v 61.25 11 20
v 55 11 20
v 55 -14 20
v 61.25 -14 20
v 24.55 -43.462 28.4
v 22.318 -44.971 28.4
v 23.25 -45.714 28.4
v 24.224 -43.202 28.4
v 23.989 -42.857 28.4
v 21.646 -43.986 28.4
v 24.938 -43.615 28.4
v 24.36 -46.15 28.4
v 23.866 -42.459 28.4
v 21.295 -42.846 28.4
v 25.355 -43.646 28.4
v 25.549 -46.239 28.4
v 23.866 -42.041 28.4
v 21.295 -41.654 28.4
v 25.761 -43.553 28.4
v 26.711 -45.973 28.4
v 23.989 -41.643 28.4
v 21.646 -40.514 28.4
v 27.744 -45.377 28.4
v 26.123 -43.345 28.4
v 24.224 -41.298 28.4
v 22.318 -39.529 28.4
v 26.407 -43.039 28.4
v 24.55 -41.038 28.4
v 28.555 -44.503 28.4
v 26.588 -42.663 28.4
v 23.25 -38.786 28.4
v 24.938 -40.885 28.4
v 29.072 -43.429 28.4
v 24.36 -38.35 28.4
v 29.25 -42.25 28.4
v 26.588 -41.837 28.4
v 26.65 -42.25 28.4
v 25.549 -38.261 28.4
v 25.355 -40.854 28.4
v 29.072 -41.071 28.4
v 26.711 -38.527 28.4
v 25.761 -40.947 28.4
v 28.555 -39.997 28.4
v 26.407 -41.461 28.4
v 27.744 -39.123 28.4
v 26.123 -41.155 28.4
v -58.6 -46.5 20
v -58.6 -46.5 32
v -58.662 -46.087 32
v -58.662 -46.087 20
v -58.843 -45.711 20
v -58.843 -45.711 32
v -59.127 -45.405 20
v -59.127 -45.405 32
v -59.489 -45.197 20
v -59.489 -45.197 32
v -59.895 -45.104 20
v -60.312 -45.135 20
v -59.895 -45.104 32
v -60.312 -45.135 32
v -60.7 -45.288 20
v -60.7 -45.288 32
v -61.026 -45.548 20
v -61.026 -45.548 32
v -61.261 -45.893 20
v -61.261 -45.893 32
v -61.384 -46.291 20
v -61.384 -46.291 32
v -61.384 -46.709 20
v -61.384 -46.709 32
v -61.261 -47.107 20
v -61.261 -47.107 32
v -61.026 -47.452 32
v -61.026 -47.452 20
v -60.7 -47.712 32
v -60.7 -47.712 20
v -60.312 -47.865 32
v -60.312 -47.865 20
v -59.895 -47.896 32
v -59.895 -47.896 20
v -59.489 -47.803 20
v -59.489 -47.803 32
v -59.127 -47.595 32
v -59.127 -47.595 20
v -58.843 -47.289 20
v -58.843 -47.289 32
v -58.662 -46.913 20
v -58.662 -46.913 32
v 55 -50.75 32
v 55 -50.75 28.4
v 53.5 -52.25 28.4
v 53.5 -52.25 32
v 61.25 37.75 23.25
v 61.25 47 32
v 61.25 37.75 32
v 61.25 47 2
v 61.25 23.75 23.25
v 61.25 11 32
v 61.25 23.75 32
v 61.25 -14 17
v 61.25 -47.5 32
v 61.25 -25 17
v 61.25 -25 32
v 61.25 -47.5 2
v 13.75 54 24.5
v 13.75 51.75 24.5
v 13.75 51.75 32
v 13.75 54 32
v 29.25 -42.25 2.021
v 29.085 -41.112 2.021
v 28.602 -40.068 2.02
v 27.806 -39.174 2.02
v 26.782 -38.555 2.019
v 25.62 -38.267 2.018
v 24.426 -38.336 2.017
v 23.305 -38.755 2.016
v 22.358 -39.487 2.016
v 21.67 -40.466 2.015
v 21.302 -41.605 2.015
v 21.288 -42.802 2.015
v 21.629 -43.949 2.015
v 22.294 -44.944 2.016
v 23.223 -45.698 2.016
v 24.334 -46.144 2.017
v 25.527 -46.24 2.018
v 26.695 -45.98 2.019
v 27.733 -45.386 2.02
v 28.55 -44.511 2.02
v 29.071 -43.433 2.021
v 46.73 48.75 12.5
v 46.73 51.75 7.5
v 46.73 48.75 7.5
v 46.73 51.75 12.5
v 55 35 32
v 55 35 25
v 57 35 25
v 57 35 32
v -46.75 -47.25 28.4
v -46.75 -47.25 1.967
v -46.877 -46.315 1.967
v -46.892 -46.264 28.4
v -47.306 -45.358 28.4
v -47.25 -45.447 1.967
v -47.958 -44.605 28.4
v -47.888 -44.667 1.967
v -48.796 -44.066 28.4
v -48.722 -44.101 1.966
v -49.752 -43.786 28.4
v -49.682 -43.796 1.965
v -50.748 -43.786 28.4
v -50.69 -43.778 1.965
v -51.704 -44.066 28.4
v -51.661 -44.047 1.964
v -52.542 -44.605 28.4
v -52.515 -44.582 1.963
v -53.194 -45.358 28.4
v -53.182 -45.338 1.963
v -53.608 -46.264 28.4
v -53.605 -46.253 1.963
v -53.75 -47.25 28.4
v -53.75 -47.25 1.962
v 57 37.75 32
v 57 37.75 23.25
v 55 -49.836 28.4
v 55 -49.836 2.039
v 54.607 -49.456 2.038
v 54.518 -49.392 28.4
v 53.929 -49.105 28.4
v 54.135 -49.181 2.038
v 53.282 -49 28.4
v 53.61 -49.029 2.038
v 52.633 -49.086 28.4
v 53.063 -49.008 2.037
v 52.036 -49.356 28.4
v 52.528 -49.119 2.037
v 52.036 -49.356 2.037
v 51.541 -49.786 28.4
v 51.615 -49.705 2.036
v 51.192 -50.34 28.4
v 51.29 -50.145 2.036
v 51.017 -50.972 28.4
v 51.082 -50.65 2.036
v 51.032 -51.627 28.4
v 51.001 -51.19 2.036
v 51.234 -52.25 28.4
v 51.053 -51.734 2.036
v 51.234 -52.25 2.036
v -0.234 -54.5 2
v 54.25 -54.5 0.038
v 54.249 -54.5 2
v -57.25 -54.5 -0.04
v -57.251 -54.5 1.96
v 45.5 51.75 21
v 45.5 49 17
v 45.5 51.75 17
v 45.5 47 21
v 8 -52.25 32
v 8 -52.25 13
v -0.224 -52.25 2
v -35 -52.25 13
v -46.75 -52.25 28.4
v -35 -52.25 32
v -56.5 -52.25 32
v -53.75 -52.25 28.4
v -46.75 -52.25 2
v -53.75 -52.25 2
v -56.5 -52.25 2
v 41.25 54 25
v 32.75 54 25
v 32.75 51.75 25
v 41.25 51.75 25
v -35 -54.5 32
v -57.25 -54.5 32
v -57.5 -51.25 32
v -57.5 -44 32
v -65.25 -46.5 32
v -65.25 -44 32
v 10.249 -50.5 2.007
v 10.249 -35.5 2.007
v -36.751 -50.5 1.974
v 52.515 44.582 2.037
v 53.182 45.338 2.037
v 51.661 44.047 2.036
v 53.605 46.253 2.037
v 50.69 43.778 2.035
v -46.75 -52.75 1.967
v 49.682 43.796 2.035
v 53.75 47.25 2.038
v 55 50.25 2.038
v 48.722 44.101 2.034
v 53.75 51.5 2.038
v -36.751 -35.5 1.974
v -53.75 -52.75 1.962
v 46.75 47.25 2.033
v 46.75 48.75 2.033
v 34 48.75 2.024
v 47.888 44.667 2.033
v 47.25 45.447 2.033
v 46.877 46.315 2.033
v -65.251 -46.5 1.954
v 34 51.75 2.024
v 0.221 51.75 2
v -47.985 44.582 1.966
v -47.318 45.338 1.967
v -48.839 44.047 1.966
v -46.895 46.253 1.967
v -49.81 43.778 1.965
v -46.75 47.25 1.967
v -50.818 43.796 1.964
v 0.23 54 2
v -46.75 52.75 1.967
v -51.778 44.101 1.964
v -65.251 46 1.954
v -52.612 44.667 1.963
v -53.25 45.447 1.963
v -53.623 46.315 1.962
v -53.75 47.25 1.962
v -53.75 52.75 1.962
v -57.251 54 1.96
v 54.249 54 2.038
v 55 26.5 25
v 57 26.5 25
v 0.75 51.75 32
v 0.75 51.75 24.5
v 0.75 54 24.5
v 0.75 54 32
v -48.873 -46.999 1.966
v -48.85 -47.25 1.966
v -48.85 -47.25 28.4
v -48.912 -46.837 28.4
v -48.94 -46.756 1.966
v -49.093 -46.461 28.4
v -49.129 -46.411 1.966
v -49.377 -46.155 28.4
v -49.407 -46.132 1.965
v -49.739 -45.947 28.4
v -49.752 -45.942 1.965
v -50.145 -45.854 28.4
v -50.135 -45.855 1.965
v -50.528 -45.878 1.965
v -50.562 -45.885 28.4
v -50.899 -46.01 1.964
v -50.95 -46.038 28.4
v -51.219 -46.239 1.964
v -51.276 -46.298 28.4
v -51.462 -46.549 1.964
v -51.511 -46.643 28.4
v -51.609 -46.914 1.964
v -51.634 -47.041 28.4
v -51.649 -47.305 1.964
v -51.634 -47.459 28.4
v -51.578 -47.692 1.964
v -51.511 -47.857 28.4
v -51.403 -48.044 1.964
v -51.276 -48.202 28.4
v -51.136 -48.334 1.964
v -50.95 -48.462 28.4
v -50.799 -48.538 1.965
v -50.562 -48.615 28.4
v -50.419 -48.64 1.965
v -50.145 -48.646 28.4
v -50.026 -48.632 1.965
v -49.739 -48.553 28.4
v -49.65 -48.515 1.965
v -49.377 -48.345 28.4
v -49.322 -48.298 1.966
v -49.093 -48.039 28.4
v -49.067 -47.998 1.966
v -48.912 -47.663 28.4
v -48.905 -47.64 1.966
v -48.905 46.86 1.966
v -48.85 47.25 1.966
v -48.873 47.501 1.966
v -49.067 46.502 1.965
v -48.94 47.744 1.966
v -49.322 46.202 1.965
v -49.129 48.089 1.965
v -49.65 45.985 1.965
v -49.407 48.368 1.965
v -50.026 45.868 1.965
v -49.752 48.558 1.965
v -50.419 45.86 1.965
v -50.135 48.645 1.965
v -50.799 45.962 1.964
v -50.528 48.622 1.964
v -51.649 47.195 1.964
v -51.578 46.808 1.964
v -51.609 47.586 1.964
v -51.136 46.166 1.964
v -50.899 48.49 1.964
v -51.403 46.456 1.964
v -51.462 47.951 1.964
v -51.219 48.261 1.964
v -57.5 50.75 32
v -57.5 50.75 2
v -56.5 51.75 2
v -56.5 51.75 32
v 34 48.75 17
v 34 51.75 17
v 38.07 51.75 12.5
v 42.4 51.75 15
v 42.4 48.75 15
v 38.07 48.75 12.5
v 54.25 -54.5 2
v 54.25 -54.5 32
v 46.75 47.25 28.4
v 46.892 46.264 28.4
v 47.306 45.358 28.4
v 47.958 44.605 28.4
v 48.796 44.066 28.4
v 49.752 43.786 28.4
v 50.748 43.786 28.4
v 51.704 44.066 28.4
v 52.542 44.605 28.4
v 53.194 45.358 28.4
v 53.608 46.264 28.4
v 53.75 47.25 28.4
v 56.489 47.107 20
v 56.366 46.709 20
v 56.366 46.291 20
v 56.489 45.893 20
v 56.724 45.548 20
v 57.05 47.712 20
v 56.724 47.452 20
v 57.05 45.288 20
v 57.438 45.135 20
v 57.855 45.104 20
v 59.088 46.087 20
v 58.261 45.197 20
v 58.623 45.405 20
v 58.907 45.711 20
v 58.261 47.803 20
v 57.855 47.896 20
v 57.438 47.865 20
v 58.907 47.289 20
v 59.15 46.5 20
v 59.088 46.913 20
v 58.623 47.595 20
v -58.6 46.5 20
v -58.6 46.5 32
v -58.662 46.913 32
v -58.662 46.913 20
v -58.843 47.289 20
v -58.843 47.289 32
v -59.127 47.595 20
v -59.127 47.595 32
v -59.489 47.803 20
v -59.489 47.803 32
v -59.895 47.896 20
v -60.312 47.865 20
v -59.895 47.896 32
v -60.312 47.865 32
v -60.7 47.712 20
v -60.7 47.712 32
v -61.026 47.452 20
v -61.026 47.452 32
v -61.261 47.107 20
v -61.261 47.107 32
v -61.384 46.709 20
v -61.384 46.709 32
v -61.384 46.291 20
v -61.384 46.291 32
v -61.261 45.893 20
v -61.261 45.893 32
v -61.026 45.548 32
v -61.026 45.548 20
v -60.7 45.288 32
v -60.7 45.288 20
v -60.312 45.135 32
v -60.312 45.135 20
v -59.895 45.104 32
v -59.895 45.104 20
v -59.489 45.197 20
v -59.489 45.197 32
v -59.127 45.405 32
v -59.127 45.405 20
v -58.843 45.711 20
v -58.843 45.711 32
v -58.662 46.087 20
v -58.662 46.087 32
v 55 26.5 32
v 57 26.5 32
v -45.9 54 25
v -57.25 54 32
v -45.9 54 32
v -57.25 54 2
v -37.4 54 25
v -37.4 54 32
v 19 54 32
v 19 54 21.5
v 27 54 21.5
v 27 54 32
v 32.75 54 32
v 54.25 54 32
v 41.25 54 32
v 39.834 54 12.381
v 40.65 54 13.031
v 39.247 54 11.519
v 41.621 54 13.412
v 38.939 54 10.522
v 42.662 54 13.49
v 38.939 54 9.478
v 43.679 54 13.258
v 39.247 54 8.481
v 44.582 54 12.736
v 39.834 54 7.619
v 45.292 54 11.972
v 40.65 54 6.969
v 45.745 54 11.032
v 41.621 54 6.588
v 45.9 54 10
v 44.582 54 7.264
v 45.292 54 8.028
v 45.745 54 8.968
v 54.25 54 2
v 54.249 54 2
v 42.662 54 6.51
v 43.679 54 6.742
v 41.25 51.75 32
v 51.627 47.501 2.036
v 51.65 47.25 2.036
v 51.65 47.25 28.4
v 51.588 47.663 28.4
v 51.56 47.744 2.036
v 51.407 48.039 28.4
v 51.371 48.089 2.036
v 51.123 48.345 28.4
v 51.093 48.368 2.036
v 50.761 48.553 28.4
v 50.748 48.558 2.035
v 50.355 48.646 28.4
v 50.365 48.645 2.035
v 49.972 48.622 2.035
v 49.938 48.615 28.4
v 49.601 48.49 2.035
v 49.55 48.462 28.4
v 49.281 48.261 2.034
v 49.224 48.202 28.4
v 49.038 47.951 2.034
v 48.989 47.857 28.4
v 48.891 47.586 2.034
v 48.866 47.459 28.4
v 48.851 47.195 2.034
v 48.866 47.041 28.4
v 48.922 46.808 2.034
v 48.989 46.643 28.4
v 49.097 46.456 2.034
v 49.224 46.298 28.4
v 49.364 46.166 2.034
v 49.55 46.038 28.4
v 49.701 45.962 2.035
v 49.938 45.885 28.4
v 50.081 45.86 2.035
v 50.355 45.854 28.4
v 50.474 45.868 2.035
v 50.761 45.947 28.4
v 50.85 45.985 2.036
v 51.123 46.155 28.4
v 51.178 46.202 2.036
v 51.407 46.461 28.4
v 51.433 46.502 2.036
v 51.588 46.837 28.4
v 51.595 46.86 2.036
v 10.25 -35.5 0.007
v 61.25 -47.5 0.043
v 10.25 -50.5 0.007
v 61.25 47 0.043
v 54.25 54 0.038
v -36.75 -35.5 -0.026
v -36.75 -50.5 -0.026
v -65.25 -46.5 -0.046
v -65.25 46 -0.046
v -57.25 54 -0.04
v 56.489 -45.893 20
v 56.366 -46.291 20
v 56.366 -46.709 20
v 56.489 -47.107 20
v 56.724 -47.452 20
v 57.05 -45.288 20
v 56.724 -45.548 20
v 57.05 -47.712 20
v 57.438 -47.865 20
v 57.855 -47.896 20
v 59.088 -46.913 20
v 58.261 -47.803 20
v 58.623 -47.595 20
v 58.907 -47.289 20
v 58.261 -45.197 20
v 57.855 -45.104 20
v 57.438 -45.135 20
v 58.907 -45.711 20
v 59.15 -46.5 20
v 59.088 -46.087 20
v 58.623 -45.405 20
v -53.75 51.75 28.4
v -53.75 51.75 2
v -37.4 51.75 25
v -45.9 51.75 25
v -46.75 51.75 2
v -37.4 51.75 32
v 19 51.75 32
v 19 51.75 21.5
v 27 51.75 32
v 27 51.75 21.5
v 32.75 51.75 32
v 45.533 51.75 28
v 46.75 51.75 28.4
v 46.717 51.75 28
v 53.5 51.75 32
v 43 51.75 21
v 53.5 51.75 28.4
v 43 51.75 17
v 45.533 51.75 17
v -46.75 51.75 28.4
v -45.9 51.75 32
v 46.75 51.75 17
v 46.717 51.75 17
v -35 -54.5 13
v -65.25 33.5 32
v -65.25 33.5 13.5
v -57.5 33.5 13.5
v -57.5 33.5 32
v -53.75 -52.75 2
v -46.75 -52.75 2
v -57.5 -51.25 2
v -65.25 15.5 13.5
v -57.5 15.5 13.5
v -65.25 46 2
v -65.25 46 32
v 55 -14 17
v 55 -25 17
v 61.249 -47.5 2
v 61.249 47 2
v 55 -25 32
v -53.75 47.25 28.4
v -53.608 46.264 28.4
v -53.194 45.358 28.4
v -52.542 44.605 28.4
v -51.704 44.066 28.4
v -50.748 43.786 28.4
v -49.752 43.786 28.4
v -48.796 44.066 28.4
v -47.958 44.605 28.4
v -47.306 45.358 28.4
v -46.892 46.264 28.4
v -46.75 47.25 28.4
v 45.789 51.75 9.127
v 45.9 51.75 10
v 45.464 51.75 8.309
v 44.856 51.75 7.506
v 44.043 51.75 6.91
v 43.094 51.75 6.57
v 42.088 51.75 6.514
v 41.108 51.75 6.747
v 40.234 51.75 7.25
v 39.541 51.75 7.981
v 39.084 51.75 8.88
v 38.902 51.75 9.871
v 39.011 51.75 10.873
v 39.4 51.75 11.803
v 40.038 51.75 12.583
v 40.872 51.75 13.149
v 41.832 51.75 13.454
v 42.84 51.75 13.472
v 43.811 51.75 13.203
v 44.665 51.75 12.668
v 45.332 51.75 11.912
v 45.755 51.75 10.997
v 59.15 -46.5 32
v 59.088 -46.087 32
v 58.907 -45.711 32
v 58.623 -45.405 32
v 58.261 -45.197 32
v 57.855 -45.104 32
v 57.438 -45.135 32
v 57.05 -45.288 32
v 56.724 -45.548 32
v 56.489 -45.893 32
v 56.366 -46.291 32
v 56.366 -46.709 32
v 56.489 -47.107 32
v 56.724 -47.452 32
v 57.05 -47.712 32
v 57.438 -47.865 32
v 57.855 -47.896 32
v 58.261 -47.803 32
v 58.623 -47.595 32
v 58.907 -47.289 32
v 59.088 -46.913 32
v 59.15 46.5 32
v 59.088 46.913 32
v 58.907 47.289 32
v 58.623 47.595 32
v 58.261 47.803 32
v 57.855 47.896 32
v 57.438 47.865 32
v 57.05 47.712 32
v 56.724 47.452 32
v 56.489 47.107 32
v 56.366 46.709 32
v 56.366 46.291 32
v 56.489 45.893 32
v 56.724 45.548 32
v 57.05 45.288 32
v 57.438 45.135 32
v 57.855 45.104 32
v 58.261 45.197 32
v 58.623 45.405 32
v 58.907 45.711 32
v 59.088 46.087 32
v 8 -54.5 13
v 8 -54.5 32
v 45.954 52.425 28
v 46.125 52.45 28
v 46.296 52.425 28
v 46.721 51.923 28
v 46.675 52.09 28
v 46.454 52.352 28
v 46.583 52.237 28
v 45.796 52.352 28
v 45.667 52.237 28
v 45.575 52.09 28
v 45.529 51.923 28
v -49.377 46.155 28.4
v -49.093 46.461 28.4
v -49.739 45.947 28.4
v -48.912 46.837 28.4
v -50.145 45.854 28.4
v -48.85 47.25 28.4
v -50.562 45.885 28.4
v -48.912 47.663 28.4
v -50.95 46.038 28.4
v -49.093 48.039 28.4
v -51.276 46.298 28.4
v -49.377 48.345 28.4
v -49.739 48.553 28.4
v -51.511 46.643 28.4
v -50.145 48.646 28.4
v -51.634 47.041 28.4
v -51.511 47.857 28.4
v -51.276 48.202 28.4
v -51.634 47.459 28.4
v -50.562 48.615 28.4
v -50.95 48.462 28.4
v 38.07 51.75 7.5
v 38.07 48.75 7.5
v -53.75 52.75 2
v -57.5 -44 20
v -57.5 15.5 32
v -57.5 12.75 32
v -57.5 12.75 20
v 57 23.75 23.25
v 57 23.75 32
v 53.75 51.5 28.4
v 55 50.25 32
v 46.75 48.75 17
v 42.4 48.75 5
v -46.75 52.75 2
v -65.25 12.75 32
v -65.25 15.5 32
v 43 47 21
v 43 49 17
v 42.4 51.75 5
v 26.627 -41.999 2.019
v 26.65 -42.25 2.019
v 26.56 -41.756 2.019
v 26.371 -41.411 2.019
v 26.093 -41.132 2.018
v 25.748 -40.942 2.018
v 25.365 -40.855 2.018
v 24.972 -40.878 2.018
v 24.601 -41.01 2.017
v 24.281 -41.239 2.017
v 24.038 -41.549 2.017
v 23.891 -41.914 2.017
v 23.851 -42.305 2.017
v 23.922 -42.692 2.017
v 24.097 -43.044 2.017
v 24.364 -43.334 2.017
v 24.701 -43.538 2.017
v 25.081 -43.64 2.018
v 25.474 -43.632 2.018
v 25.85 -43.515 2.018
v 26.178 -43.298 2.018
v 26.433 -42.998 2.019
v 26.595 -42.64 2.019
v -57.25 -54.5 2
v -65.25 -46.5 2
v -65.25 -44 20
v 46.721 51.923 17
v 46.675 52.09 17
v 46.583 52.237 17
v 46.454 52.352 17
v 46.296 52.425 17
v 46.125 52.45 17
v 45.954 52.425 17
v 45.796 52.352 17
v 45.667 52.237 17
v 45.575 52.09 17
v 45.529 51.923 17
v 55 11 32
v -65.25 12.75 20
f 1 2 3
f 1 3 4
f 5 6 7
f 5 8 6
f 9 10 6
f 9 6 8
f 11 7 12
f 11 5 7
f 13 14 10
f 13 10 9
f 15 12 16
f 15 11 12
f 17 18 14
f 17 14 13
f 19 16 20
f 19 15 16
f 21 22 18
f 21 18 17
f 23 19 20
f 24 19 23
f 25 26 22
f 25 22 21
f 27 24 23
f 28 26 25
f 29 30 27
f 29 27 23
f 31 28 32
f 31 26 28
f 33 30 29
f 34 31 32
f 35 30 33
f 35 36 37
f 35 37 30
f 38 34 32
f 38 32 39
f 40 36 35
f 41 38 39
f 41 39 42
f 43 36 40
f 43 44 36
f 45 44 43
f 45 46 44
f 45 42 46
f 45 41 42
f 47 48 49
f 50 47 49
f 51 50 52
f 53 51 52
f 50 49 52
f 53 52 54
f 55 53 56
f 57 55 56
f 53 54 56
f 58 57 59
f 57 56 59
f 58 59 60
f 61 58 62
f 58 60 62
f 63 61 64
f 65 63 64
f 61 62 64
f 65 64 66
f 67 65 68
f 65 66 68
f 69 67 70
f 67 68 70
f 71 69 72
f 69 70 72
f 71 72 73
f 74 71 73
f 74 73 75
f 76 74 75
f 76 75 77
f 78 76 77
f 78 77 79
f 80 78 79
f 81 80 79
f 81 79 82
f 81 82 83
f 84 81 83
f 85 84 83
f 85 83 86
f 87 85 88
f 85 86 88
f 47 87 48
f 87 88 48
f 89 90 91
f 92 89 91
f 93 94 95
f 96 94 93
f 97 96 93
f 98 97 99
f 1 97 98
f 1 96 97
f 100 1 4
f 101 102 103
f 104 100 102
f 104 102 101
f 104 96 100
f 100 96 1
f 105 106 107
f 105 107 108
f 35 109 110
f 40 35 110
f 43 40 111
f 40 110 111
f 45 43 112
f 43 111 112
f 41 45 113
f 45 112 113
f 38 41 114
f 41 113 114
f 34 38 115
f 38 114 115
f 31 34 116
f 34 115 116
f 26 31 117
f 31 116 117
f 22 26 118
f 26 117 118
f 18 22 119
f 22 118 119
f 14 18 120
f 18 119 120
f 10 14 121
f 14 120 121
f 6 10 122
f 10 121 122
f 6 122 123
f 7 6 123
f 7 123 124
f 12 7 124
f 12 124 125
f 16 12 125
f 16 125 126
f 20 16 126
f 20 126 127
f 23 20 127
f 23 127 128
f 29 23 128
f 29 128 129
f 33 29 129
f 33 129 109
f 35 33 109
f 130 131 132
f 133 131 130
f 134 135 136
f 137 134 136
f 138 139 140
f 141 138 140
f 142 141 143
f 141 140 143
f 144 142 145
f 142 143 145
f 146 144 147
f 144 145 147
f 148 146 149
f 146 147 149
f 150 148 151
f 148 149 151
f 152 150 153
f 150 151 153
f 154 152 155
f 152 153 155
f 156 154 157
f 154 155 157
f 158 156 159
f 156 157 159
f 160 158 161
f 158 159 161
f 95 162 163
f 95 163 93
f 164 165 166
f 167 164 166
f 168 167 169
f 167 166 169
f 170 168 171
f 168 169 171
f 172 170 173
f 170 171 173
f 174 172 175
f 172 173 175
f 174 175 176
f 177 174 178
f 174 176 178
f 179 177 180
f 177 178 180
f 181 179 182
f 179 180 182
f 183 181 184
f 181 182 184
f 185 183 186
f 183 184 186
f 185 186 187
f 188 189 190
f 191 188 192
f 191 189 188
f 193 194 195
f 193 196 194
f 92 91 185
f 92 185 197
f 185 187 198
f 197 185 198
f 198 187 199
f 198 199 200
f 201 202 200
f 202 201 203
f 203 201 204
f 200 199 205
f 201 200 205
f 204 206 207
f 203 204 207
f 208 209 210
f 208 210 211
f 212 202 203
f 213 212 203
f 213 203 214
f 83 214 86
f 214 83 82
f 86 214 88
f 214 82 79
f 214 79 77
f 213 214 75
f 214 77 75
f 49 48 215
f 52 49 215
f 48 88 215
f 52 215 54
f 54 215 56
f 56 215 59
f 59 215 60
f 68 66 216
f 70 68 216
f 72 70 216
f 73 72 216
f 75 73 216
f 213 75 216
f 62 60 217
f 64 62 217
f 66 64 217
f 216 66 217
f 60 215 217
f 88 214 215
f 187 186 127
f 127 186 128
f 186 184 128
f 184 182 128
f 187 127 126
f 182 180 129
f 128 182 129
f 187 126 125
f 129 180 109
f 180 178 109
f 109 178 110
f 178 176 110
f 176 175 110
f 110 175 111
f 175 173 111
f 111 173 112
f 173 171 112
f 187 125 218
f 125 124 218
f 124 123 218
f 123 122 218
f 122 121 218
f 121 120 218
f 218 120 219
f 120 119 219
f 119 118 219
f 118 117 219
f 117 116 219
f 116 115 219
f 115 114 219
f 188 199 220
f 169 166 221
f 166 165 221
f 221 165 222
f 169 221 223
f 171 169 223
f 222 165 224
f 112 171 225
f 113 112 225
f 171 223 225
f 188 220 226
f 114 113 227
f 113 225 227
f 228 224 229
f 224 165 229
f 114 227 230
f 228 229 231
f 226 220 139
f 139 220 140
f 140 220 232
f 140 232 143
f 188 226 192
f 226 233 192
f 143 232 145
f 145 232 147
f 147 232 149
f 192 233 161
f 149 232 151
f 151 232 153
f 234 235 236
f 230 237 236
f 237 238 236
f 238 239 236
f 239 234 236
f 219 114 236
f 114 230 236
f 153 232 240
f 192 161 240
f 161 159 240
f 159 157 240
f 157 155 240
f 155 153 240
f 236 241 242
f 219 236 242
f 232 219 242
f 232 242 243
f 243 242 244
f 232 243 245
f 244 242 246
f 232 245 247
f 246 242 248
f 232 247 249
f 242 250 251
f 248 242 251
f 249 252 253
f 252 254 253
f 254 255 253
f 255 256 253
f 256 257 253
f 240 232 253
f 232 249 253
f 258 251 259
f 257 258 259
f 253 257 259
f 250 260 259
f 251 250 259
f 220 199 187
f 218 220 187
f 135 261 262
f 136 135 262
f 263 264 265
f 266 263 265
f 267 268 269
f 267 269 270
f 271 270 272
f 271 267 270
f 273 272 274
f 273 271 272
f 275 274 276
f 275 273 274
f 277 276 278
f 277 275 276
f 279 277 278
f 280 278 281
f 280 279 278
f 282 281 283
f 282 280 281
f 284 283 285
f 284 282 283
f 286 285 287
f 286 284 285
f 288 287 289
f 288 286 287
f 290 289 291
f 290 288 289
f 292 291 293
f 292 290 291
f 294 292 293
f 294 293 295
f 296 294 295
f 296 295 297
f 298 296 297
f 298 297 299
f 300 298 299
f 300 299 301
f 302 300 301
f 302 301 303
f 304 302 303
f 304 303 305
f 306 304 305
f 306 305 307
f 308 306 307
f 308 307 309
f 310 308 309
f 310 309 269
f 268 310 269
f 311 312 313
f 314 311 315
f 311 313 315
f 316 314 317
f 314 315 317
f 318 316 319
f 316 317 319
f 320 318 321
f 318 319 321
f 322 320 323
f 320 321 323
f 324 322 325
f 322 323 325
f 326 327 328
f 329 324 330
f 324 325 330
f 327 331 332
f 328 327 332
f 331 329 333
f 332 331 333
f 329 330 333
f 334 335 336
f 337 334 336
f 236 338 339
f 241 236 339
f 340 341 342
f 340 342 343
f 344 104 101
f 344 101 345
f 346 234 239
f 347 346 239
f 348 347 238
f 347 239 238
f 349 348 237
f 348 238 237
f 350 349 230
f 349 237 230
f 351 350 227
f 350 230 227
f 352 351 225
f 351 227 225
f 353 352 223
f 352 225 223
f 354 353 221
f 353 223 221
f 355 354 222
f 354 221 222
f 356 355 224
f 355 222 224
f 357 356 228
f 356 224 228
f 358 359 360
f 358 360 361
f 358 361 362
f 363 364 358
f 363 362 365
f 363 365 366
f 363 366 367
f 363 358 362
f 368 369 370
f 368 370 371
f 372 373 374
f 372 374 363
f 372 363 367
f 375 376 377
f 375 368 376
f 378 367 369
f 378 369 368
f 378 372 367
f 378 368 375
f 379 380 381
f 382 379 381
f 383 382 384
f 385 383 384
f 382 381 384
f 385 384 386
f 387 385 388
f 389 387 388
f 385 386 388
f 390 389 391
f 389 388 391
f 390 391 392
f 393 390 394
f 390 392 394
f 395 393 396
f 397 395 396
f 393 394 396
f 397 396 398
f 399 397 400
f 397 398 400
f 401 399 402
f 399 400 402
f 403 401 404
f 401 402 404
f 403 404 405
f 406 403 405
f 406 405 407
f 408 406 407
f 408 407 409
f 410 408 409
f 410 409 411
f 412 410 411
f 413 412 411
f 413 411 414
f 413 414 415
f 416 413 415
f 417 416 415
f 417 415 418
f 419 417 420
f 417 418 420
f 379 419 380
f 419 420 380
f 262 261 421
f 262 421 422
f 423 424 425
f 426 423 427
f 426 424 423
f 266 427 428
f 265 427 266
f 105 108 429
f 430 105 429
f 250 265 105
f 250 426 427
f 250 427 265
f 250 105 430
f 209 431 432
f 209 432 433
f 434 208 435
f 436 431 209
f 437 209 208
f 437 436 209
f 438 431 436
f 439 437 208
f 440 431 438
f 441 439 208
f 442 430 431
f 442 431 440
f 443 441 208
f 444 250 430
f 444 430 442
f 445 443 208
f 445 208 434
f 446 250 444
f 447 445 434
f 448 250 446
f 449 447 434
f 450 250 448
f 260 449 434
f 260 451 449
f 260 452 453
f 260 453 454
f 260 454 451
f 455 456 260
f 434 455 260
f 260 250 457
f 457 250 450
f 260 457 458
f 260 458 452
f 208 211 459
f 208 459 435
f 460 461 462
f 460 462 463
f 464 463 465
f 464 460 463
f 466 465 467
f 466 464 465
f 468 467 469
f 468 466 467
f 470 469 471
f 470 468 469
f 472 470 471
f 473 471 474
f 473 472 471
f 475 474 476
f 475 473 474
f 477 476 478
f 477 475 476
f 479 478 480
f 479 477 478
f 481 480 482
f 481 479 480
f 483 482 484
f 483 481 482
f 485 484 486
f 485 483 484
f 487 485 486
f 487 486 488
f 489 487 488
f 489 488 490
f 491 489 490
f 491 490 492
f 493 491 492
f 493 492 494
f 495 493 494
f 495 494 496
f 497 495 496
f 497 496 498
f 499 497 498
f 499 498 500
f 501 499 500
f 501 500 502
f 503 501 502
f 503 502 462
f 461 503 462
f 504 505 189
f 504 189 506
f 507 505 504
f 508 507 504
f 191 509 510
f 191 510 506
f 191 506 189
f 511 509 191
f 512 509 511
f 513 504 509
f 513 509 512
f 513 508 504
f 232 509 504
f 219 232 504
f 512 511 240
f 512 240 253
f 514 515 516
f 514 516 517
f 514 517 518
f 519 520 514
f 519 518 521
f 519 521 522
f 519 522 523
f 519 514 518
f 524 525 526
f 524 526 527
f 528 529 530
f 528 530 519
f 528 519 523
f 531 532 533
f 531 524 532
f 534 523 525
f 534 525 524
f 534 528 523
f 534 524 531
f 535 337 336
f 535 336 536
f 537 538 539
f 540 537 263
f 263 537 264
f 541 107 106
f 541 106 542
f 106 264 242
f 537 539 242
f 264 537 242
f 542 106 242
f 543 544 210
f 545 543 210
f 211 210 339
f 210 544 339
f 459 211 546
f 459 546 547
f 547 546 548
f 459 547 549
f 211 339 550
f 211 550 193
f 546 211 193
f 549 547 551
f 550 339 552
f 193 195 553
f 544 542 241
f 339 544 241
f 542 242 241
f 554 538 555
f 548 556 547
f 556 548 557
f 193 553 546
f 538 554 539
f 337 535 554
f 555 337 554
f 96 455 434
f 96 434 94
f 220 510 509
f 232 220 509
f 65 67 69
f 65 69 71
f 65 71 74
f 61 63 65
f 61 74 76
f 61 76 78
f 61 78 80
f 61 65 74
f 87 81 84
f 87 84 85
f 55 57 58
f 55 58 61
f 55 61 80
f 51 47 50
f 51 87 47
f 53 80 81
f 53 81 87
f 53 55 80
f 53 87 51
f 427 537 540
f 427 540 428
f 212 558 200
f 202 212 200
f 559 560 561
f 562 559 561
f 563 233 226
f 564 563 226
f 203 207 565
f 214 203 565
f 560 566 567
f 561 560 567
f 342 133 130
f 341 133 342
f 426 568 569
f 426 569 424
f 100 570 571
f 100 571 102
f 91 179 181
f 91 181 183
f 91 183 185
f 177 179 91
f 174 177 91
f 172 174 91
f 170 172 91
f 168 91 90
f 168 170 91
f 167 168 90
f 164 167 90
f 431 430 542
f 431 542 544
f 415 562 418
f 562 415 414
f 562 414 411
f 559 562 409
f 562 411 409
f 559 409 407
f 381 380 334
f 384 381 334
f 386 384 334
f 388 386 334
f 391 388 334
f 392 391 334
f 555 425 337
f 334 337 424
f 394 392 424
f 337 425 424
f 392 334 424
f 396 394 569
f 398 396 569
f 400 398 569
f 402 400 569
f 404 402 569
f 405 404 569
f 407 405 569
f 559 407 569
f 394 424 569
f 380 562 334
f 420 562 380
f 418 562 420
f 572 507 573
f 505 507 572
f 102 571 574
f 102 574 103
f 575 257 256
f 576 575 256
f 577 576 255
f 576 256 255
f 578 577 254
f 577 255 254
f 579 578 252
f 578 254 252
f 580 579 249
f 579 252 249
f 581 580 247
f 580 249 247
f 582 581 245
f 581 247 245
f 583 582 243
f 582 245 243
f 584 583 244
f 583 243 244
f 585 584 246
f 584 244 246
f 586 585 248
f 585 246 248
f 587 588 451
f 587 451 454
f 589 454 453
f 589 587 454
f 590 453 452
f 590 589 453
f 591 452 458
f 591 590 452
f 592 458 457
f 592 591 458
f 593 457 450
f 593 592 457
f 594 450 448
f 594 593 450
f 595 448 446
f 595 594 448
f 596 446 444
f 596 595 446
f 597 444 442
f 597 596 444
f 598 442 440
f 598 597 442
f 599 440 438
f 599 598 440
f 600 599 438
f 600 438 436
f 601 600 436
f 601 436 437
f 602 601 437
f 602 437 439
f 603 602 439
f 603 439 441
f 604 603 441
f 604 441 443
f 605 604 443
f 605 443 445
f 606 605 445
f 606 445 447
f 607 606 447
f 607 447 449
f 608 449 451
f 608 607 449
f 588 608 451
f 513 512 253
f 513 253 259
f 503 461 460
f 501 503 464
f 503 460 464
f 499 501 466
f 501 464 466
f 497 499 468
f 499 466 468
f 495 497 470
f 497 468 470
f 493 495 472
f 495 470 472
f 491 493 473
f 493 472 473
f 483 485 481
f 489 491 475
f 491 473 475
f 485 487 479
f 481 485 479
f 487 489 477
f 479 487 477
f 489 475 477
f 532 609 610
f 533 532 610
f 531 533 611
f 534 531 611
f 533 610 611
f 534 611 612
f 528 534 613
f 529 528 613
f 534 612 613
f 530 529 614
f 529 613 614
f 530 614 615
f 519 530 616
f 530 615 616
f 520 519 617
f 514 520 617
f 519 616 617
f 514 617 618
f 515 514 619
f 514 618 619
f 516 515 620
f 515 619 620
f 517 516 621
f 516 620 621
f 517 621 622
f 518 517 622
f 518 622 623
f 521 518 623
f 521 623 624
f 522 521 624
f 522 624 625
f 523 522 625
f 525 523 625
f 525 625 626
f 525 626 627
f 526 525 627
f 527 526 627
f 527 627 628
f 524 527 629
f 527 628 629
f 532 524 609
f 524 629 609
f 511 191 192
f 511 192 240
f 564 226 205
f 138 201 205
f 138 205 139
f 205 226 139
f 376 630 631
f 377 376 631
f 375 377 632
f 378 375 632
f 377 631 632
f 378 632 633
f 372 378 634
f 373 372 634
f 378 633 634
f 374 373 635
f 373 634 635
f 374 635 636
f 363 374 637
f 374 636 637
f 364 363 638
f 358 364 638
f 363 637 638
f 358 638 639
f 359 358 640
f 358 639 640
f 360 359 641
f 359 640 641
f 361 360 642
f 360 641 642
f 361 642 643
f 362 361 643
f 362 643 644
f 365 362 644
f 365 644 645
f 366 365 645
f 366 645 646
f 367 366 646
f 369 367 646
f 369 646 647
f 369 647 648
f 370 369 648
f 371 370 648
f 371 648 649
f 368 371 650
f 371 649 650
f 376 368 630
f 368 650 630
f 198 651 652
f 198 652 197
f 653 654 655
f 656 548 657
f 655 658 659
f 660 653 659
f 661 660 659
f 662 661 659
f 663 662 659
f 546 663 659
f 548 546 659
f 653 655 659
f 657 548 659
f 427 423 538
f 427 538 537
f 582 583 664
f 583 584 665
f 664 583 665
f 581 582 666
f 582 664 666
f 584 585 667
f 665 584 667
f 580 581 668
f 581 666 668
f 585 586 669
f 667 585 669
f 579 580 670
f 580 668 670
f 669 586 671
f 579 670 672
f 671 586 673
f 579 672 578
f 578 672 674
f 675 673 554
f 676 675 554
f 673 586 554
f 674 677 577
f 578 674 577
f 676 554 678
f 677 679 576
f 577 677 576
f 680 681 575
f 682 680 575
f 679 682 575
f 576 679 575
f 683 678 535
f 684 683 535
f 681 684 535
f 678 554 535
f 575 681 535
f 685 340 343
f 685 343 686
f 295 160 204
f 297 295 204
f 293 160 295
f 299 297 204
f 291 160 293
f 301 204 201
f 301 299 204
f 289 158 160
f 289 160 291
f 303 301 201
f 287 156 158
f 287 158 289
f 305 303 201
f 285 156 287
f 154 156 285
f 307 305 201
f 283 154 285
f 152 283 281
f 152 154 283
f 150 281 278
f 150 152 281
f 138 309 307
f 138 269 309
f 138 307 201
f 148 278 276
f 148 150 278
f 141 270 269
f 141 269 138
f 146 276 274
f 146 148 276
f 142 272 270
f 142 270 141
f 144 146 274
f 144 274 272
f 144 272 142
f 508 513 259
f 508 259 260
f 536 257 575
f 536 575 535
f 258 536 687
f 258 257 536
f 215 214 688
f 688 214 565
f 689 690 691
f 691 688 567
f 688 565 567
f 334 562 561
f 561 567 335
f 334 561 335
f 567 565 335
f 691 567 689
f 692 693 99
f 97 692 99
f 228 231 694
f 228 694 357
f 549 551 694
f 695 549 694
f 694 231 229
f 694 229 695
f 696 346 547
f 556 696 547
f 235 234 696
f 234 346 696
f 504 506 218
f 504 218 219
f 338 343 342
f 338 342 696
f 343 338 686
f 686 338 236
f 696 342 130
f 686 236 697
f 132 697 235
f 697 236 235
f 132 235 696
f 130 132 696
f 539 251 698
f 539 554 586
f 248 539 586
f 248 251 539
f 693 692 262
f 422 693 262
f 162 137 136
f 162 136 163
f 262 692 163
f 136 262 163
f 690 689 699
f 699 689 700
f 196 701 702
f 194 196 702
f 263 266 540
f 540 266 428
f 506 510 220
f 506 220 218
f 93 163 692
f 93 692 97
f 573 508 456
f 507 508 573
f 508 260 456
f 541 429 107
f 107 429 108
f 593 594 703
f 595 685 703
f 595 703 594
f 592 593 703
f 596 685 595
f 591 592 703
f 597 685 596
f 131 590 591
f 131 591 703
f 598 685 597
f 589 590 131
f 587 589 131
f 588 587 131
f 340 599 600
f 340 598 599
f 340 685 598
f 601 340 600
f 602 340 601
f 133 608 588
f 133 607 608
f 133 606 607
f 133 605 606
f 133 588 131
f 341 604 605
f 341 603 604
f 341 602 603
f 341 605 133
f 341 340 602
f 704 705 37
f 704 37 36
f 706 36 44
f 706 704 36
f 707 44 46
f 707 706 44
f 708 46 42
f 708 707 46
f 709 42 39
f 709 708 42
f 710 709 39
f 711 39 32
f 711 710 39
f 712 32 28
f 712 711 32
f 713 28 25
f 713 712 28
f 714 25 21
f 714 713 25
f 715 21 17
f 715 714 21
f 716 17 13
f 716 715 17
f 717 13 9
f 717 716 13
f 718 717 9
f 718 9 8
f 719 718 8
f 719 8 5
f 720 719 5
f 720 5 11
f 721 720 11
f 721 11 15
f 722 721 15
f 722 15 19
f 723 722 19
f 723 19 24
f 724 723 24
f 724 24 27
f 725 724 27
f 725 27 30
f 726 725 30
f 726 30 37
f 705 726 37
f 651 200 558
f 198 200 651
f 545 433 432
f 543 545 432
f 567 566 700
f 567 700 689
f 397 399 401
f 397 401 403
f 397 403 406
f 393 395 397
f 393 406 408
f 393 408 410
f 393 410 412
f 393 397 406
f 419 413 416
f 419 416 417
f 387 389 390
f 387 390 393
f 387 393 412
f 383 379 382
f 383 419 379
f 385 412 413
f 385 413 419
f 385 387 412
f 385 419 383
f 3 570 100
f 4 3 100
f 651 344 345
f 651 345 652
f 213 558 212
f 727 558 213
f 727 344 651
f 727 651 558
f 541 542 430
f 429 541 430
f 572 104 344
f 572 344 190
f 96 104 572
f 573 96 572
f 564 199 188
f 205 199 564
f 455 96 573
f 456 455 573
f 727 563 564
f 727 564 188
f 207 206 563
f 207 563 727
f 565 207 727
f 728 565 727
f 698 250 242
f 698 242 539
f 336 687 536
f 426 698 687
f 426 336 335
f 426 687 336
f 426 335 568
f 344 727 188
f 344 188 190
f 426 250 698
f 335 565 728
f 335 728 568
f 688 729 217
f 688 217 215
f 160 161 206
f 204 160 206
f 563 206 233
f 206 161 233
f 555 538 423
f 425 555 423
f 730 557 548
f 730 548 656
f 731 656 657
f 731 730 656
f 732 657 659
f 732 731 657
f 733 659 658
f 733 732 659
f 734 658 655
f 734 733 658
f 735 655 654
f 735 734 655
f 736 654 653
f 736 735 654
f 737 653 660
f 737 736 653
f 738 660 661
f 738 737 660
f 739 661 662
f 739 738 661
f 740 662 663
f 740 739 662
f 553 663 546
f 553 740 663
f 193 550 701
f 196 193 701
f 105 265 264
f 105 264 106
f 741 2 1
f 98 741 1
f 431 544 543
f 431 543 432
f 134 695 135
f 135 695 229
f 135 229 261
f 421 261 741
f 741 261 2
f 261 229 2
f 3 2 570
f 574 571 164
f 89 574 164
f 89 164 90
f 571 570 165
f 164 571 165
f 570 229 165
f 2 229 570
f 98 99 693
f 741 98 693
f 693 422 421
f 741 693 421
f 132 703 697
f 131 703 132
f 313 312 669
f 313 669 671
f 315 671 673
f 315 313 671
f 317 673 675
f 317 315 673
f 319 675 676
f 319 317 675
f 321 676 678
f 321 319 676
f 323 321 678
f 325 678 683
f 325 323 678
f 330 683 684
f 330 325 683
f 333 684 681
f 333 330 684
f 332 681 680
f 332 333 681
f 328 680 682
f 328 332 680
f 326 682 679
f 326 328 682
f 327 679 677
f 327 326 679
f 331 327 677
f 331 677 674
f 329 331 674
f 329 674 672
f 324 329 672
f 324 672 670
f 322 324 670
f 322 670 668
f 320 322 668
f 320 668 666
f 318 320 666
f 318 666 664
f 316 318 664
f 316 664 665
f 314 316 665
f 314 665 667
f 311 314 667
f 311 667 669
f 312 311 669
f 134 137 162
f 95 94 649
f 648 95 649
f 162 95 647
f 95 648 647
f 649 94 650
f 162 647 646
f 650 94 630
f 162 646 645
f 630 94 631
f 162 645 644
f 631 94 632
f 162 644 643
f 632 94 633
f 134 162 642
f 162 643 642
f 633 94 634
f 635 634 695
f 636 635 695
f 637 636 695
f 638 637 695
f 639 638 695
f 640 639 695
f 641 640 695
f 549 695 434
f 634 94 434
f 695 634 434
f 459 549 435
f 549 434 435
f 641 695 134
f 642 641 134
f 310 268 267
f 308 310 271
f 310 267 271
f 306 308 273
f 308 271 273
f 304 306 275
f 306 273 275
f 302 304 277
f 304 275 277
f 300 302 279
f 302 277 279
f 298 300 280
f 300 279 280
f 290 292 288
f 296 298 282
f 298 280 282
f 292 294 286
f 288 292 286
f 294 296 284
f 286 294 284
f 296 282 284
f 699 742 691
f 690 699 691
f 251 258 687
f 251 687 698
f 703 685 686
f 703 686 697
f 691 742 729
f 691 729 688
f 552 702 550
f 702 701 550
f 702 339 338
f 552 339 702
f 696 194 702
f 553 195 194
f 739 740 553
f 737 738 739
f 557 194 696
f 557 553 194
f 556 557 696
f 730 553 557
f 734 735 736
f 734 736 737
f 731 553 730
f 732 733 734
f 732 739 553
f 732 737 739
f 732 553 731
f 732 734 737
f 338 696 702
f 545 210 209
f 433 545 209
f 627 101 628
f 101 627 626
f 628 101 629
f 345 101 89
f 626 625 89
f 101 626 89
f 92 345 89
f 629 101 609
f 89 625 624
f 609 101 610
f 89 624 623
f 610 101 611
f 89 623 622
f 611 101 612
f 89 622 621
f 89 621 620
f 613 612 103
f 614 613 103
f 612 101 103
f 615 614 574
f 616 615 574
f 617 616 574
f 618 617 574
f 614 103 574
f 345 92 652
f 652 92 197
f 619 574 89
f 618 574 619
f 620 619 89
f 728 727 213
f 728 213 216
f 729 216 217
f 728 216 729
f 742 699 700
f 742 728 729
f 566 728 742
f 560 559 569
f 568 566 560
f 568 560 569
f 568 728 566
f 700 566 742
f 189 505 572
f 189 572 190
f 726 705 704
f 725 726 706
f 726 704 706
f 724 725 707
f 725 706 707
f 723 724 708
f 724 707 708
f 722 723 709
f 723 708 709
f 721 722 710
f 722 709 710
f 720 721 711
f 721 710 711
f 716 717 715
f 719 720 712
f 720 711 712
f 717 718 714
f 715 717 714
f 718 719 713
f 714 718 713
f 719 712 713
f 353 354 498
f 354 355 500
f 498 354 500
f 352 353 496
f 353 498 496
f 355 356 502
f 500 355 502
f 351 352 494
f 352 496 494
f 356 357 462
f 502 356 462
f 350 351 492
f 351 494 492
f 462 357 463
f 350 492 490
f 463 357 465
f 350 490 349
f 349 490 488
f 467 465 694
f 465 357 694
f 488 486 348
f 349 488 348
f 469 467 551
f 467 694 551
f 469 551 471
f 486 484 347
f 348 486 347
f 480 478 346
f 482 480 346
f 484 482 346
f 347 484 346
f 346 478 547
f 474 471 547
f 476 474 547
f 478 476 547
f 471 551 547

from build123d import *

# Parameters (mm, degrees)
CYLINDER007_R              = 3.5
CYLINDER007_DEPTH          = 8
CYLINDER007_ROLL_ANGLE     = -90
CYLINDER008_R              = 0.6
CYLINDER008_DEPTH          = 11
PRISM001_DEPTH             = 10
PRISM001_ROLL_ANGLE        = 90.00003
PRISM001_PITCH_ANGLE       = -30.000033
PRISM001_PLACEMENT_ANGLE   = -8e-06
BOX015_W                   = 10
BOX015_H                   = 18
BOX015_DEPTH               = 20
BOX016_W                   = 10
BOX016_H                   = 11
BOX016_DEPTH               = 15
BOX017_W                   = 10
BOX017_H                   = 25
BOX017_DEPTH               = 12
BOX018_W                   = 8.5
BOX018_H                   = 4
BOX018_DEPTH               = 7
BOX019_W                   = 8
BOX019_H                   = 4
BOX019_DEPTH               = 10.5
BOX020_W                   = 8.5
BOX020_H                   = 4
BOX020_DEPTH               = 7
BOX021_W                   = 13
BOX021_H                   = 4
BOX021_DEPTH               = 8
BOX022_W                   = 10
BOX022_H                   = 8.5
BOX022_DEPTH               = 8
BOX023_W                   = 5
BOX023_H                   = 14
BOX023_DEPTH               = 9
BOX024_W                   = 43
BOX024_H                   = 4
BOX024_DEPTH               = 19
SKETCH104_R                = 1.4
EXTRUDE093_DEPTH           = 12
BOX014_W                   = 10
BOX014_H                   = 56.75
BOX014_DEPTH               = 12
EXTRUDE092_DEPTH           = 30
EXTRUDE091_DEPTH           = 30
SKETCH101_R                = 4
SKETCH101_R_2              = 1.4
SKETCH101_R_3              = 2.25
EXTRUDE090_DEPTH           = 27.4
BOX026_W                   = 13
BOX026_H                   = 3
BOX026_DEPTH               = 15
EXTRUDE094_DEPTH           = 2.5
SKETCH100_W                = 47
SKETCH100_H                = 15
EXTRUDE089_DEPTH           = 2
EXTRUDE089_ROLL_ANGLE      = -0.000172
EXTRUDE089_PITCH_ANGLE     = -0.040176
EXTRUDE089_PLACEMENT_ANGLE = 2.8e-05


with BuildPart() as cylinder007:
    # Cylinder007 → Cylinder007 (new body)
    with BuildSketch(Plane.XY):
        Circle(CYLINDER007_R)
    extrude(amount=CYLINDER007_DEPTH)


with BuildPart() as cylinder007_1:
    # Cylinder007 roll: moved
    add(cylinder007.part.rotate(Axis((0, 0, 0), (1, 0, 0)), CYLINDER007_ROLL_ANGLE))


with BuildPart() as cylinder007_2:
    # Cylinder007 placement: moved
    add(cylinder007_1.part.moved(Location((42.4, 48, 10))))


with BuildPart() as cylinder008:
    # Cylinder008 → Cylinder008 (new body)
    with BuildSketch(Plane(origin=(46.125, 51.85, 17), x_dir=(1, 0, 0), z_dir=(0, 0, 1))):
        Circle(CYLINDER008_R)
    extrude(amount=CYLINDER008_DEPTH)


with BuildPart() as fusion035005:
    # Prism001 → Prism001 (new body)
    with BuildSketch(Plane.XY):
        Polygon((5, 0), (2.5, 4.330127), (-2.5, 4.330127), (-5, 0), (-2.5, -4.330127), (2.5, -4.330127), align=None)
    extrude(amount=PRISM001_DEPTH)


with BuildPart() as fusion035005_1:
    # Prism001 roll: moved
    add(fusion035005.part.rotate(Axis((0, 0, 0), (1, 0, 0)), PRISM001_ROLL_ANGLE))


with BuildPart() as fusion035005_2:
    # Prism001 pitch: moved
    add(fusion035005_1.part.rotate(Axis((0, 0, 0), (0, 1, 0)), PRISM001_PITCH_ANGLE))


with BuildPart() as fusion035005_3:
    # Prism001 placement: moved
    add(fusion035005_2.part.moved(Location((42.4, 51.75, 10))).rotate(Axis((42.4, 51.75, 10), (0, 0, 1)), PRISM001_PLACEMENT_ANGLE))

    # Fusion035005: union Cylinder007, Cylinder008
    add(cylinder007_2.part)
    add(cylinder008.part)


with BuildPart() as cube015:
    # Box015 → Box015 (new body)
    with BuildSketch(Plane(origin=(-67, 15.5, 8.5), x_dir=(1, 0, 0), z_dir=(0, 0, 1))):
        with Locations((5, 9)):
            Rectangle(BOX015_W, BOX015_H)
    extrude(amount=BOX015_DEPTH)


with BuildPart() as cube016:
    # Box016 → Box016 (new body)
    with BuildSketch(Plane(origin=(54, -25, 12), x_dir=(1, 0, 0), z_dir=(0, 0, 1))):
        with Locations((5, 5.5)):
            Rectangle(BOX016_W, BOX016_H)
    extrude(amount=BOX016_DEPTH)


with BuildPart() as cube017:
    # Box017 → Box017 (new body)
    with BuildSketch(Plane(origin=(54, -14, 15), x_dir=(1, 0, 0), z_dir=(0, 0, 1))):
        with Locations((5, 12.5)):
            Rectangle(BOX017_W, BOX017_H)
    extrude(amount=BOX017_DEPTH)


with BuildPart() as cube018:
    # Box018 → Box018 (new body)
    with BuildSketch(Plane(origin=(32.75, 51, 20), x_dir=(1, 0, 0), z_dir=(0, 0, 1))):
        with Locations((4.25, 2)):
            Rectangle(BOX018_W, BOX018_H)
    extrude(amount=BOX018_DEPTH)


with BuildPart() as cube019:
    # Box019 → Box019 (new body)
    with BuildSketch(Plane(origin=(19, 51, 16.5), x_dir=(1, 0, 0), z_dir=(0, 0, 1))):
        with Locations((4, 2)):
            Rectangle(BOX019_W, BOX019_H)
    extrude(amount=BOX019_DEPTH)


with BuildPart() as cube020:
    # Box020 → Box020 (new body)
    with BuildSketch(Plane(origin=(-45.9, 51, 20), x_dir=(1, 0, 0), z_dir=(0, 0, 1))):
        with Locations((4.25, 2)):
            Rectangle(BOX020_W, BOX020_H)
    extrude(amount=BOX020_DEPTH)


with BuildPart() as cube021:
    # Box021 → Box021 (new body)
    with BuildSketch(Plane(origin=(0.75, 51, 19.5), x_dir=(1, 0, 0), z_dir=(0, 0, 1))):
        with Locations((6.5, 2)):
            Rectangle(BOX021_W, BOX021_H)
    extrude(amount=BOX021_DEPTH)


with BuildPart() as cube022:
    # Box022 → Box022 (new body)
    with BuildSketch(Plane(origin=(54, 26.5, 20), x_dir=(1, 0, 0), z_dir=(0, 0, 1))):
        with Locations((5, 4.25)):
            Rectangle(BOX022_W, BOX022_H)
    extrude(amount=BOX022_DEPTH)


with BuildPart() as cube023:
    # Box023 → Box023 (new body)
    with BuildSketch(Plane(origin=(57, 23.75, 18.25), x_dir=(1, 0, 0), z_dir=(0, 0, 1))):
        with Locations((2.5, 7)):
            Rectangle(BOX023_W, BOX023_H)
    extrude(amount=BOX023_DEPTH)


with BuildPart() as cube024:
    # Box024 → Box024 (new body)
    with BuildSketch(Plane(origin=(-35, -56, 8), x_dir=(1, 0, 0), z_dir=(0, 0, 1))):
        with Locations((21.5, 2)):
            Rectangle(BOX024_W, BOX024_H)
    extrude(amount=BOX024_DEPTH)


with BuildPart() as extrude093:
    # Sketch104 → Extrude093 (new body)
    with BuildSketch(Plane.XY.offset(27)):
        with Locations((-60, 46.5)):
            Circle(SKETCH104_R)
        with Locations((57.75, 46.5)):
            Circle(SKETCH104_R)
        with Locations((-60, -46.5)):
            Circle(SKETCH104_R)
        with Locations((57.75, -46.5)):
            Circle(SKETCH104_R)
    extrude(amount=-EXTRUDE093_DEPTH)


with BuildPart() as fusion035003:
    # Box014 → Box014 (new body)
    with BuildSketch(Plane(origin=(-67, -44, 15), x_dir=(1, 0, 0), z_dir=(0, 0, 1))):
        with Locations((5, 28.375)):
            Rectangle(BOX014_W, BOX014_H)
    extrude(amount=BOX014_DEPTH)

    # Fusion035003: union Cube015, Cube016, Cube017, Cube018, Cube019, Cube020, Cube021, Cube022, Cube023, Cube024, Extrude093
    add(cube015.part)
    add(cube016.part)
    add(cube017.part)
    add(cube018.part)
    add(cube019.part)
    add(cube020.part)
    add(cube021.part)
    add(cube022.part)
    add(cube023.part)
    add(cube024.part)
    add(extrude093.part)


with BuildPart() as fusion035003_1:
    # Fusion035003 placement: moved
    add(fusion035003.part.moved(Location((0, 0, 5))))


with BuildPart() as extrude092:
    # Sketch103 → Extrude092 (new body)
    with BuildSketch(Plane.XY):
        Polygon((53.5, -52.25), (-56.5, -52.25), (-57.5, -51.25), (-57.5, 50.75), (-56.5, 51.75), (53.5, 51.75), (55, 50.25), (55, -50.75), align=None)
    extrude(amount=EXTRUDE092_DEPTH)


with BuildPart() as cut008:
    # Sketch102 → Extrude091 (new body)
    with BuildSketch(Plane.XY):
        Polygon((54.25, -54.5), (-57.25, -54.5), (-65.25, -46.5), (-65.25, 46), (-57.25, 54), (54.25, 54), (61.25, 47), (61.25, -47.5), align=None)
    extrude(amount=EXTRUDE091_DEPTH)

    # Cut007: cut Extrude092
    add(extrude092.part, mode=Mode.SUBTRACT)


with BuildPart() as cut008_1:
    # Cut007 placement: moved
    add(cut008.part.moved(Location((0, 0, 2))))

    # Cut008: cut Fusion035003
    add(fusion035003_1.part, mode=Mode.SUBTRACT)


with BuildPart() as extrude090:
    # Sketch101 → Extrude090 (new body)
    with BuildSketch(Plane.XY):
        with Locations((25.25, -42.25)):
            Circle(SKETCH101_R)
        with Locations((25.25, -42.25)):
            Circle(SKETCH101_R_2, mode=Mode.SUBTRACT)
        with Locations((53.25, -51.25)):
            Circle(SKETCH101_R_3)
        with BuildLine():
            Line((-53.75, 52.75), (-46.75, 52.75))
            Line((-46.75, 52.75), (-46.75, 47.25))
            ThreePointArc((-53.75, 47.25), (-50.25, 43.75), (-46.75, 47.25))
            Line((-53.75, 47.25), (-53.75, 52.75))
        make_face()
        with Locations((-50.25, 47.25)):
            Circle(SKETCH101_R_2, mode=Mode.SUBTRACT)
        with BuildLine():
            Line((46.75, 52.75), (53.75, 52.75))
            Line((53.75, 52.75), (53.75, 47.25))
            ThreePointArc((46.75, 47.25), (50.25, 43.75), (53.75, 47.25))
            Line((46.75, 47.25), (46.75, 52.75))
        make_face()
        with Locations((50.25, 47.25)):
            Circle(SKETCH101_R_2, mode=Mode.SUBTRACT)
        with BuildLine():
            Line((-53.75, -52.75), (-46.75, -52.75))
            Line((-46.75, -52.75), (-46.75, -47.25))
            ThreePointArc((-46.75, -47.25), (-50.25, -43.75), (-53.75, -47.25))
            Line((-53.75, -47.25), (-53.75, -52.75))
        make_face()
        with Locations((-50.25, -47.25)):
            Circle(SKETCH101_R_2, mode=Mode.SUBTRACT)
    extrude(amount=EXTRUDE090_DEPTH)


with BuildPart() as extrude090_1:
    # Extrude090 placement: moved
    add(extrude090.part.moved(Location((0, 0, 1))))


with BuildPart() as cube026:
    # Box026 → Box026 (new body)
    with BuildSketch(Plane(origin=(34, 48.75, 2), x_dir=(1, 0, 0), z_dir=(0, 0, 1))):
        with Locations((6.5, 1.5)):
            Rectangle(BOX026_W, BOX026_H)
    extrude(amount=BOX026_DEPTH)


with BuildPart() as extrude094:
    # Sketch105 → Extrude094 (new body)
    with BuildSketch(Plane.YZ):
        Polygon((0, 0), (0, 5), (-5, 5), (-2.5, 0), align=None)
    extrude(amount=EXTRUDE094_DEPTH)


with BuildPart() as extrude094_1:
    # Extrude094 placement: moved
    add(extrude094.part.moved(Location((43, 52, 16))))


with BuildPart() as colibri3box:
    # Sketch100 → Extrude089 (new body)
    with BuildSketch(Plane.XY):
        Polygon((54.25, -54.5), (-57.25, -54.5), (-65.25, -46.5), (-65.25, 46), (-57.25, 54), (54.25, 54), (61.25, 47), (61.25, -47.5), align=None)
        with Locations((-13.25, -43)):
            Rectangle(SKETCH100_W, SKETCH100_H, mode=Mode.SUBTRACT)
    extrude(amount=EXTRUDE089_DEPTH)


with BuildPart() as colibri3box_1:
    # Extrude089 roll: moved
    add(colibri3box.part.rotate(Axis((0, 0, 0), (1, 0, 0)), EXTRUDE089_ROLL_ANGLE))


with BuildPart() as colibri3box_2:
    # Extrude089 pitch: moved
    add(colibri3box_1.part.rotate(Axis((0, 0, 0), (0, 1, 0)), EXTRUDE089_PITCH_ANGLE))


with BuildPart() as colibri3box_3:
    # Extrude089 placement: moved
    add(colibri3box_2.part.rotate(Axis((0, 0, 0), (0, 0, 1)), EXTRUDE089_PLACEMENT_ANGLE))

    # Fusion035002: union Extrude090, Cube026, Extrude094
    add(extrude090_1.part)
    add(cube026.part)
    add(extrude094_1.part)

    # Fusion035004: union Cut008
    add(cut008_1.part)

    # Cut009: cut Fusion035005
    add(fusion035005_3.part, mode=Mode.SUBTRACT)


solid = colibri3box_3.part
